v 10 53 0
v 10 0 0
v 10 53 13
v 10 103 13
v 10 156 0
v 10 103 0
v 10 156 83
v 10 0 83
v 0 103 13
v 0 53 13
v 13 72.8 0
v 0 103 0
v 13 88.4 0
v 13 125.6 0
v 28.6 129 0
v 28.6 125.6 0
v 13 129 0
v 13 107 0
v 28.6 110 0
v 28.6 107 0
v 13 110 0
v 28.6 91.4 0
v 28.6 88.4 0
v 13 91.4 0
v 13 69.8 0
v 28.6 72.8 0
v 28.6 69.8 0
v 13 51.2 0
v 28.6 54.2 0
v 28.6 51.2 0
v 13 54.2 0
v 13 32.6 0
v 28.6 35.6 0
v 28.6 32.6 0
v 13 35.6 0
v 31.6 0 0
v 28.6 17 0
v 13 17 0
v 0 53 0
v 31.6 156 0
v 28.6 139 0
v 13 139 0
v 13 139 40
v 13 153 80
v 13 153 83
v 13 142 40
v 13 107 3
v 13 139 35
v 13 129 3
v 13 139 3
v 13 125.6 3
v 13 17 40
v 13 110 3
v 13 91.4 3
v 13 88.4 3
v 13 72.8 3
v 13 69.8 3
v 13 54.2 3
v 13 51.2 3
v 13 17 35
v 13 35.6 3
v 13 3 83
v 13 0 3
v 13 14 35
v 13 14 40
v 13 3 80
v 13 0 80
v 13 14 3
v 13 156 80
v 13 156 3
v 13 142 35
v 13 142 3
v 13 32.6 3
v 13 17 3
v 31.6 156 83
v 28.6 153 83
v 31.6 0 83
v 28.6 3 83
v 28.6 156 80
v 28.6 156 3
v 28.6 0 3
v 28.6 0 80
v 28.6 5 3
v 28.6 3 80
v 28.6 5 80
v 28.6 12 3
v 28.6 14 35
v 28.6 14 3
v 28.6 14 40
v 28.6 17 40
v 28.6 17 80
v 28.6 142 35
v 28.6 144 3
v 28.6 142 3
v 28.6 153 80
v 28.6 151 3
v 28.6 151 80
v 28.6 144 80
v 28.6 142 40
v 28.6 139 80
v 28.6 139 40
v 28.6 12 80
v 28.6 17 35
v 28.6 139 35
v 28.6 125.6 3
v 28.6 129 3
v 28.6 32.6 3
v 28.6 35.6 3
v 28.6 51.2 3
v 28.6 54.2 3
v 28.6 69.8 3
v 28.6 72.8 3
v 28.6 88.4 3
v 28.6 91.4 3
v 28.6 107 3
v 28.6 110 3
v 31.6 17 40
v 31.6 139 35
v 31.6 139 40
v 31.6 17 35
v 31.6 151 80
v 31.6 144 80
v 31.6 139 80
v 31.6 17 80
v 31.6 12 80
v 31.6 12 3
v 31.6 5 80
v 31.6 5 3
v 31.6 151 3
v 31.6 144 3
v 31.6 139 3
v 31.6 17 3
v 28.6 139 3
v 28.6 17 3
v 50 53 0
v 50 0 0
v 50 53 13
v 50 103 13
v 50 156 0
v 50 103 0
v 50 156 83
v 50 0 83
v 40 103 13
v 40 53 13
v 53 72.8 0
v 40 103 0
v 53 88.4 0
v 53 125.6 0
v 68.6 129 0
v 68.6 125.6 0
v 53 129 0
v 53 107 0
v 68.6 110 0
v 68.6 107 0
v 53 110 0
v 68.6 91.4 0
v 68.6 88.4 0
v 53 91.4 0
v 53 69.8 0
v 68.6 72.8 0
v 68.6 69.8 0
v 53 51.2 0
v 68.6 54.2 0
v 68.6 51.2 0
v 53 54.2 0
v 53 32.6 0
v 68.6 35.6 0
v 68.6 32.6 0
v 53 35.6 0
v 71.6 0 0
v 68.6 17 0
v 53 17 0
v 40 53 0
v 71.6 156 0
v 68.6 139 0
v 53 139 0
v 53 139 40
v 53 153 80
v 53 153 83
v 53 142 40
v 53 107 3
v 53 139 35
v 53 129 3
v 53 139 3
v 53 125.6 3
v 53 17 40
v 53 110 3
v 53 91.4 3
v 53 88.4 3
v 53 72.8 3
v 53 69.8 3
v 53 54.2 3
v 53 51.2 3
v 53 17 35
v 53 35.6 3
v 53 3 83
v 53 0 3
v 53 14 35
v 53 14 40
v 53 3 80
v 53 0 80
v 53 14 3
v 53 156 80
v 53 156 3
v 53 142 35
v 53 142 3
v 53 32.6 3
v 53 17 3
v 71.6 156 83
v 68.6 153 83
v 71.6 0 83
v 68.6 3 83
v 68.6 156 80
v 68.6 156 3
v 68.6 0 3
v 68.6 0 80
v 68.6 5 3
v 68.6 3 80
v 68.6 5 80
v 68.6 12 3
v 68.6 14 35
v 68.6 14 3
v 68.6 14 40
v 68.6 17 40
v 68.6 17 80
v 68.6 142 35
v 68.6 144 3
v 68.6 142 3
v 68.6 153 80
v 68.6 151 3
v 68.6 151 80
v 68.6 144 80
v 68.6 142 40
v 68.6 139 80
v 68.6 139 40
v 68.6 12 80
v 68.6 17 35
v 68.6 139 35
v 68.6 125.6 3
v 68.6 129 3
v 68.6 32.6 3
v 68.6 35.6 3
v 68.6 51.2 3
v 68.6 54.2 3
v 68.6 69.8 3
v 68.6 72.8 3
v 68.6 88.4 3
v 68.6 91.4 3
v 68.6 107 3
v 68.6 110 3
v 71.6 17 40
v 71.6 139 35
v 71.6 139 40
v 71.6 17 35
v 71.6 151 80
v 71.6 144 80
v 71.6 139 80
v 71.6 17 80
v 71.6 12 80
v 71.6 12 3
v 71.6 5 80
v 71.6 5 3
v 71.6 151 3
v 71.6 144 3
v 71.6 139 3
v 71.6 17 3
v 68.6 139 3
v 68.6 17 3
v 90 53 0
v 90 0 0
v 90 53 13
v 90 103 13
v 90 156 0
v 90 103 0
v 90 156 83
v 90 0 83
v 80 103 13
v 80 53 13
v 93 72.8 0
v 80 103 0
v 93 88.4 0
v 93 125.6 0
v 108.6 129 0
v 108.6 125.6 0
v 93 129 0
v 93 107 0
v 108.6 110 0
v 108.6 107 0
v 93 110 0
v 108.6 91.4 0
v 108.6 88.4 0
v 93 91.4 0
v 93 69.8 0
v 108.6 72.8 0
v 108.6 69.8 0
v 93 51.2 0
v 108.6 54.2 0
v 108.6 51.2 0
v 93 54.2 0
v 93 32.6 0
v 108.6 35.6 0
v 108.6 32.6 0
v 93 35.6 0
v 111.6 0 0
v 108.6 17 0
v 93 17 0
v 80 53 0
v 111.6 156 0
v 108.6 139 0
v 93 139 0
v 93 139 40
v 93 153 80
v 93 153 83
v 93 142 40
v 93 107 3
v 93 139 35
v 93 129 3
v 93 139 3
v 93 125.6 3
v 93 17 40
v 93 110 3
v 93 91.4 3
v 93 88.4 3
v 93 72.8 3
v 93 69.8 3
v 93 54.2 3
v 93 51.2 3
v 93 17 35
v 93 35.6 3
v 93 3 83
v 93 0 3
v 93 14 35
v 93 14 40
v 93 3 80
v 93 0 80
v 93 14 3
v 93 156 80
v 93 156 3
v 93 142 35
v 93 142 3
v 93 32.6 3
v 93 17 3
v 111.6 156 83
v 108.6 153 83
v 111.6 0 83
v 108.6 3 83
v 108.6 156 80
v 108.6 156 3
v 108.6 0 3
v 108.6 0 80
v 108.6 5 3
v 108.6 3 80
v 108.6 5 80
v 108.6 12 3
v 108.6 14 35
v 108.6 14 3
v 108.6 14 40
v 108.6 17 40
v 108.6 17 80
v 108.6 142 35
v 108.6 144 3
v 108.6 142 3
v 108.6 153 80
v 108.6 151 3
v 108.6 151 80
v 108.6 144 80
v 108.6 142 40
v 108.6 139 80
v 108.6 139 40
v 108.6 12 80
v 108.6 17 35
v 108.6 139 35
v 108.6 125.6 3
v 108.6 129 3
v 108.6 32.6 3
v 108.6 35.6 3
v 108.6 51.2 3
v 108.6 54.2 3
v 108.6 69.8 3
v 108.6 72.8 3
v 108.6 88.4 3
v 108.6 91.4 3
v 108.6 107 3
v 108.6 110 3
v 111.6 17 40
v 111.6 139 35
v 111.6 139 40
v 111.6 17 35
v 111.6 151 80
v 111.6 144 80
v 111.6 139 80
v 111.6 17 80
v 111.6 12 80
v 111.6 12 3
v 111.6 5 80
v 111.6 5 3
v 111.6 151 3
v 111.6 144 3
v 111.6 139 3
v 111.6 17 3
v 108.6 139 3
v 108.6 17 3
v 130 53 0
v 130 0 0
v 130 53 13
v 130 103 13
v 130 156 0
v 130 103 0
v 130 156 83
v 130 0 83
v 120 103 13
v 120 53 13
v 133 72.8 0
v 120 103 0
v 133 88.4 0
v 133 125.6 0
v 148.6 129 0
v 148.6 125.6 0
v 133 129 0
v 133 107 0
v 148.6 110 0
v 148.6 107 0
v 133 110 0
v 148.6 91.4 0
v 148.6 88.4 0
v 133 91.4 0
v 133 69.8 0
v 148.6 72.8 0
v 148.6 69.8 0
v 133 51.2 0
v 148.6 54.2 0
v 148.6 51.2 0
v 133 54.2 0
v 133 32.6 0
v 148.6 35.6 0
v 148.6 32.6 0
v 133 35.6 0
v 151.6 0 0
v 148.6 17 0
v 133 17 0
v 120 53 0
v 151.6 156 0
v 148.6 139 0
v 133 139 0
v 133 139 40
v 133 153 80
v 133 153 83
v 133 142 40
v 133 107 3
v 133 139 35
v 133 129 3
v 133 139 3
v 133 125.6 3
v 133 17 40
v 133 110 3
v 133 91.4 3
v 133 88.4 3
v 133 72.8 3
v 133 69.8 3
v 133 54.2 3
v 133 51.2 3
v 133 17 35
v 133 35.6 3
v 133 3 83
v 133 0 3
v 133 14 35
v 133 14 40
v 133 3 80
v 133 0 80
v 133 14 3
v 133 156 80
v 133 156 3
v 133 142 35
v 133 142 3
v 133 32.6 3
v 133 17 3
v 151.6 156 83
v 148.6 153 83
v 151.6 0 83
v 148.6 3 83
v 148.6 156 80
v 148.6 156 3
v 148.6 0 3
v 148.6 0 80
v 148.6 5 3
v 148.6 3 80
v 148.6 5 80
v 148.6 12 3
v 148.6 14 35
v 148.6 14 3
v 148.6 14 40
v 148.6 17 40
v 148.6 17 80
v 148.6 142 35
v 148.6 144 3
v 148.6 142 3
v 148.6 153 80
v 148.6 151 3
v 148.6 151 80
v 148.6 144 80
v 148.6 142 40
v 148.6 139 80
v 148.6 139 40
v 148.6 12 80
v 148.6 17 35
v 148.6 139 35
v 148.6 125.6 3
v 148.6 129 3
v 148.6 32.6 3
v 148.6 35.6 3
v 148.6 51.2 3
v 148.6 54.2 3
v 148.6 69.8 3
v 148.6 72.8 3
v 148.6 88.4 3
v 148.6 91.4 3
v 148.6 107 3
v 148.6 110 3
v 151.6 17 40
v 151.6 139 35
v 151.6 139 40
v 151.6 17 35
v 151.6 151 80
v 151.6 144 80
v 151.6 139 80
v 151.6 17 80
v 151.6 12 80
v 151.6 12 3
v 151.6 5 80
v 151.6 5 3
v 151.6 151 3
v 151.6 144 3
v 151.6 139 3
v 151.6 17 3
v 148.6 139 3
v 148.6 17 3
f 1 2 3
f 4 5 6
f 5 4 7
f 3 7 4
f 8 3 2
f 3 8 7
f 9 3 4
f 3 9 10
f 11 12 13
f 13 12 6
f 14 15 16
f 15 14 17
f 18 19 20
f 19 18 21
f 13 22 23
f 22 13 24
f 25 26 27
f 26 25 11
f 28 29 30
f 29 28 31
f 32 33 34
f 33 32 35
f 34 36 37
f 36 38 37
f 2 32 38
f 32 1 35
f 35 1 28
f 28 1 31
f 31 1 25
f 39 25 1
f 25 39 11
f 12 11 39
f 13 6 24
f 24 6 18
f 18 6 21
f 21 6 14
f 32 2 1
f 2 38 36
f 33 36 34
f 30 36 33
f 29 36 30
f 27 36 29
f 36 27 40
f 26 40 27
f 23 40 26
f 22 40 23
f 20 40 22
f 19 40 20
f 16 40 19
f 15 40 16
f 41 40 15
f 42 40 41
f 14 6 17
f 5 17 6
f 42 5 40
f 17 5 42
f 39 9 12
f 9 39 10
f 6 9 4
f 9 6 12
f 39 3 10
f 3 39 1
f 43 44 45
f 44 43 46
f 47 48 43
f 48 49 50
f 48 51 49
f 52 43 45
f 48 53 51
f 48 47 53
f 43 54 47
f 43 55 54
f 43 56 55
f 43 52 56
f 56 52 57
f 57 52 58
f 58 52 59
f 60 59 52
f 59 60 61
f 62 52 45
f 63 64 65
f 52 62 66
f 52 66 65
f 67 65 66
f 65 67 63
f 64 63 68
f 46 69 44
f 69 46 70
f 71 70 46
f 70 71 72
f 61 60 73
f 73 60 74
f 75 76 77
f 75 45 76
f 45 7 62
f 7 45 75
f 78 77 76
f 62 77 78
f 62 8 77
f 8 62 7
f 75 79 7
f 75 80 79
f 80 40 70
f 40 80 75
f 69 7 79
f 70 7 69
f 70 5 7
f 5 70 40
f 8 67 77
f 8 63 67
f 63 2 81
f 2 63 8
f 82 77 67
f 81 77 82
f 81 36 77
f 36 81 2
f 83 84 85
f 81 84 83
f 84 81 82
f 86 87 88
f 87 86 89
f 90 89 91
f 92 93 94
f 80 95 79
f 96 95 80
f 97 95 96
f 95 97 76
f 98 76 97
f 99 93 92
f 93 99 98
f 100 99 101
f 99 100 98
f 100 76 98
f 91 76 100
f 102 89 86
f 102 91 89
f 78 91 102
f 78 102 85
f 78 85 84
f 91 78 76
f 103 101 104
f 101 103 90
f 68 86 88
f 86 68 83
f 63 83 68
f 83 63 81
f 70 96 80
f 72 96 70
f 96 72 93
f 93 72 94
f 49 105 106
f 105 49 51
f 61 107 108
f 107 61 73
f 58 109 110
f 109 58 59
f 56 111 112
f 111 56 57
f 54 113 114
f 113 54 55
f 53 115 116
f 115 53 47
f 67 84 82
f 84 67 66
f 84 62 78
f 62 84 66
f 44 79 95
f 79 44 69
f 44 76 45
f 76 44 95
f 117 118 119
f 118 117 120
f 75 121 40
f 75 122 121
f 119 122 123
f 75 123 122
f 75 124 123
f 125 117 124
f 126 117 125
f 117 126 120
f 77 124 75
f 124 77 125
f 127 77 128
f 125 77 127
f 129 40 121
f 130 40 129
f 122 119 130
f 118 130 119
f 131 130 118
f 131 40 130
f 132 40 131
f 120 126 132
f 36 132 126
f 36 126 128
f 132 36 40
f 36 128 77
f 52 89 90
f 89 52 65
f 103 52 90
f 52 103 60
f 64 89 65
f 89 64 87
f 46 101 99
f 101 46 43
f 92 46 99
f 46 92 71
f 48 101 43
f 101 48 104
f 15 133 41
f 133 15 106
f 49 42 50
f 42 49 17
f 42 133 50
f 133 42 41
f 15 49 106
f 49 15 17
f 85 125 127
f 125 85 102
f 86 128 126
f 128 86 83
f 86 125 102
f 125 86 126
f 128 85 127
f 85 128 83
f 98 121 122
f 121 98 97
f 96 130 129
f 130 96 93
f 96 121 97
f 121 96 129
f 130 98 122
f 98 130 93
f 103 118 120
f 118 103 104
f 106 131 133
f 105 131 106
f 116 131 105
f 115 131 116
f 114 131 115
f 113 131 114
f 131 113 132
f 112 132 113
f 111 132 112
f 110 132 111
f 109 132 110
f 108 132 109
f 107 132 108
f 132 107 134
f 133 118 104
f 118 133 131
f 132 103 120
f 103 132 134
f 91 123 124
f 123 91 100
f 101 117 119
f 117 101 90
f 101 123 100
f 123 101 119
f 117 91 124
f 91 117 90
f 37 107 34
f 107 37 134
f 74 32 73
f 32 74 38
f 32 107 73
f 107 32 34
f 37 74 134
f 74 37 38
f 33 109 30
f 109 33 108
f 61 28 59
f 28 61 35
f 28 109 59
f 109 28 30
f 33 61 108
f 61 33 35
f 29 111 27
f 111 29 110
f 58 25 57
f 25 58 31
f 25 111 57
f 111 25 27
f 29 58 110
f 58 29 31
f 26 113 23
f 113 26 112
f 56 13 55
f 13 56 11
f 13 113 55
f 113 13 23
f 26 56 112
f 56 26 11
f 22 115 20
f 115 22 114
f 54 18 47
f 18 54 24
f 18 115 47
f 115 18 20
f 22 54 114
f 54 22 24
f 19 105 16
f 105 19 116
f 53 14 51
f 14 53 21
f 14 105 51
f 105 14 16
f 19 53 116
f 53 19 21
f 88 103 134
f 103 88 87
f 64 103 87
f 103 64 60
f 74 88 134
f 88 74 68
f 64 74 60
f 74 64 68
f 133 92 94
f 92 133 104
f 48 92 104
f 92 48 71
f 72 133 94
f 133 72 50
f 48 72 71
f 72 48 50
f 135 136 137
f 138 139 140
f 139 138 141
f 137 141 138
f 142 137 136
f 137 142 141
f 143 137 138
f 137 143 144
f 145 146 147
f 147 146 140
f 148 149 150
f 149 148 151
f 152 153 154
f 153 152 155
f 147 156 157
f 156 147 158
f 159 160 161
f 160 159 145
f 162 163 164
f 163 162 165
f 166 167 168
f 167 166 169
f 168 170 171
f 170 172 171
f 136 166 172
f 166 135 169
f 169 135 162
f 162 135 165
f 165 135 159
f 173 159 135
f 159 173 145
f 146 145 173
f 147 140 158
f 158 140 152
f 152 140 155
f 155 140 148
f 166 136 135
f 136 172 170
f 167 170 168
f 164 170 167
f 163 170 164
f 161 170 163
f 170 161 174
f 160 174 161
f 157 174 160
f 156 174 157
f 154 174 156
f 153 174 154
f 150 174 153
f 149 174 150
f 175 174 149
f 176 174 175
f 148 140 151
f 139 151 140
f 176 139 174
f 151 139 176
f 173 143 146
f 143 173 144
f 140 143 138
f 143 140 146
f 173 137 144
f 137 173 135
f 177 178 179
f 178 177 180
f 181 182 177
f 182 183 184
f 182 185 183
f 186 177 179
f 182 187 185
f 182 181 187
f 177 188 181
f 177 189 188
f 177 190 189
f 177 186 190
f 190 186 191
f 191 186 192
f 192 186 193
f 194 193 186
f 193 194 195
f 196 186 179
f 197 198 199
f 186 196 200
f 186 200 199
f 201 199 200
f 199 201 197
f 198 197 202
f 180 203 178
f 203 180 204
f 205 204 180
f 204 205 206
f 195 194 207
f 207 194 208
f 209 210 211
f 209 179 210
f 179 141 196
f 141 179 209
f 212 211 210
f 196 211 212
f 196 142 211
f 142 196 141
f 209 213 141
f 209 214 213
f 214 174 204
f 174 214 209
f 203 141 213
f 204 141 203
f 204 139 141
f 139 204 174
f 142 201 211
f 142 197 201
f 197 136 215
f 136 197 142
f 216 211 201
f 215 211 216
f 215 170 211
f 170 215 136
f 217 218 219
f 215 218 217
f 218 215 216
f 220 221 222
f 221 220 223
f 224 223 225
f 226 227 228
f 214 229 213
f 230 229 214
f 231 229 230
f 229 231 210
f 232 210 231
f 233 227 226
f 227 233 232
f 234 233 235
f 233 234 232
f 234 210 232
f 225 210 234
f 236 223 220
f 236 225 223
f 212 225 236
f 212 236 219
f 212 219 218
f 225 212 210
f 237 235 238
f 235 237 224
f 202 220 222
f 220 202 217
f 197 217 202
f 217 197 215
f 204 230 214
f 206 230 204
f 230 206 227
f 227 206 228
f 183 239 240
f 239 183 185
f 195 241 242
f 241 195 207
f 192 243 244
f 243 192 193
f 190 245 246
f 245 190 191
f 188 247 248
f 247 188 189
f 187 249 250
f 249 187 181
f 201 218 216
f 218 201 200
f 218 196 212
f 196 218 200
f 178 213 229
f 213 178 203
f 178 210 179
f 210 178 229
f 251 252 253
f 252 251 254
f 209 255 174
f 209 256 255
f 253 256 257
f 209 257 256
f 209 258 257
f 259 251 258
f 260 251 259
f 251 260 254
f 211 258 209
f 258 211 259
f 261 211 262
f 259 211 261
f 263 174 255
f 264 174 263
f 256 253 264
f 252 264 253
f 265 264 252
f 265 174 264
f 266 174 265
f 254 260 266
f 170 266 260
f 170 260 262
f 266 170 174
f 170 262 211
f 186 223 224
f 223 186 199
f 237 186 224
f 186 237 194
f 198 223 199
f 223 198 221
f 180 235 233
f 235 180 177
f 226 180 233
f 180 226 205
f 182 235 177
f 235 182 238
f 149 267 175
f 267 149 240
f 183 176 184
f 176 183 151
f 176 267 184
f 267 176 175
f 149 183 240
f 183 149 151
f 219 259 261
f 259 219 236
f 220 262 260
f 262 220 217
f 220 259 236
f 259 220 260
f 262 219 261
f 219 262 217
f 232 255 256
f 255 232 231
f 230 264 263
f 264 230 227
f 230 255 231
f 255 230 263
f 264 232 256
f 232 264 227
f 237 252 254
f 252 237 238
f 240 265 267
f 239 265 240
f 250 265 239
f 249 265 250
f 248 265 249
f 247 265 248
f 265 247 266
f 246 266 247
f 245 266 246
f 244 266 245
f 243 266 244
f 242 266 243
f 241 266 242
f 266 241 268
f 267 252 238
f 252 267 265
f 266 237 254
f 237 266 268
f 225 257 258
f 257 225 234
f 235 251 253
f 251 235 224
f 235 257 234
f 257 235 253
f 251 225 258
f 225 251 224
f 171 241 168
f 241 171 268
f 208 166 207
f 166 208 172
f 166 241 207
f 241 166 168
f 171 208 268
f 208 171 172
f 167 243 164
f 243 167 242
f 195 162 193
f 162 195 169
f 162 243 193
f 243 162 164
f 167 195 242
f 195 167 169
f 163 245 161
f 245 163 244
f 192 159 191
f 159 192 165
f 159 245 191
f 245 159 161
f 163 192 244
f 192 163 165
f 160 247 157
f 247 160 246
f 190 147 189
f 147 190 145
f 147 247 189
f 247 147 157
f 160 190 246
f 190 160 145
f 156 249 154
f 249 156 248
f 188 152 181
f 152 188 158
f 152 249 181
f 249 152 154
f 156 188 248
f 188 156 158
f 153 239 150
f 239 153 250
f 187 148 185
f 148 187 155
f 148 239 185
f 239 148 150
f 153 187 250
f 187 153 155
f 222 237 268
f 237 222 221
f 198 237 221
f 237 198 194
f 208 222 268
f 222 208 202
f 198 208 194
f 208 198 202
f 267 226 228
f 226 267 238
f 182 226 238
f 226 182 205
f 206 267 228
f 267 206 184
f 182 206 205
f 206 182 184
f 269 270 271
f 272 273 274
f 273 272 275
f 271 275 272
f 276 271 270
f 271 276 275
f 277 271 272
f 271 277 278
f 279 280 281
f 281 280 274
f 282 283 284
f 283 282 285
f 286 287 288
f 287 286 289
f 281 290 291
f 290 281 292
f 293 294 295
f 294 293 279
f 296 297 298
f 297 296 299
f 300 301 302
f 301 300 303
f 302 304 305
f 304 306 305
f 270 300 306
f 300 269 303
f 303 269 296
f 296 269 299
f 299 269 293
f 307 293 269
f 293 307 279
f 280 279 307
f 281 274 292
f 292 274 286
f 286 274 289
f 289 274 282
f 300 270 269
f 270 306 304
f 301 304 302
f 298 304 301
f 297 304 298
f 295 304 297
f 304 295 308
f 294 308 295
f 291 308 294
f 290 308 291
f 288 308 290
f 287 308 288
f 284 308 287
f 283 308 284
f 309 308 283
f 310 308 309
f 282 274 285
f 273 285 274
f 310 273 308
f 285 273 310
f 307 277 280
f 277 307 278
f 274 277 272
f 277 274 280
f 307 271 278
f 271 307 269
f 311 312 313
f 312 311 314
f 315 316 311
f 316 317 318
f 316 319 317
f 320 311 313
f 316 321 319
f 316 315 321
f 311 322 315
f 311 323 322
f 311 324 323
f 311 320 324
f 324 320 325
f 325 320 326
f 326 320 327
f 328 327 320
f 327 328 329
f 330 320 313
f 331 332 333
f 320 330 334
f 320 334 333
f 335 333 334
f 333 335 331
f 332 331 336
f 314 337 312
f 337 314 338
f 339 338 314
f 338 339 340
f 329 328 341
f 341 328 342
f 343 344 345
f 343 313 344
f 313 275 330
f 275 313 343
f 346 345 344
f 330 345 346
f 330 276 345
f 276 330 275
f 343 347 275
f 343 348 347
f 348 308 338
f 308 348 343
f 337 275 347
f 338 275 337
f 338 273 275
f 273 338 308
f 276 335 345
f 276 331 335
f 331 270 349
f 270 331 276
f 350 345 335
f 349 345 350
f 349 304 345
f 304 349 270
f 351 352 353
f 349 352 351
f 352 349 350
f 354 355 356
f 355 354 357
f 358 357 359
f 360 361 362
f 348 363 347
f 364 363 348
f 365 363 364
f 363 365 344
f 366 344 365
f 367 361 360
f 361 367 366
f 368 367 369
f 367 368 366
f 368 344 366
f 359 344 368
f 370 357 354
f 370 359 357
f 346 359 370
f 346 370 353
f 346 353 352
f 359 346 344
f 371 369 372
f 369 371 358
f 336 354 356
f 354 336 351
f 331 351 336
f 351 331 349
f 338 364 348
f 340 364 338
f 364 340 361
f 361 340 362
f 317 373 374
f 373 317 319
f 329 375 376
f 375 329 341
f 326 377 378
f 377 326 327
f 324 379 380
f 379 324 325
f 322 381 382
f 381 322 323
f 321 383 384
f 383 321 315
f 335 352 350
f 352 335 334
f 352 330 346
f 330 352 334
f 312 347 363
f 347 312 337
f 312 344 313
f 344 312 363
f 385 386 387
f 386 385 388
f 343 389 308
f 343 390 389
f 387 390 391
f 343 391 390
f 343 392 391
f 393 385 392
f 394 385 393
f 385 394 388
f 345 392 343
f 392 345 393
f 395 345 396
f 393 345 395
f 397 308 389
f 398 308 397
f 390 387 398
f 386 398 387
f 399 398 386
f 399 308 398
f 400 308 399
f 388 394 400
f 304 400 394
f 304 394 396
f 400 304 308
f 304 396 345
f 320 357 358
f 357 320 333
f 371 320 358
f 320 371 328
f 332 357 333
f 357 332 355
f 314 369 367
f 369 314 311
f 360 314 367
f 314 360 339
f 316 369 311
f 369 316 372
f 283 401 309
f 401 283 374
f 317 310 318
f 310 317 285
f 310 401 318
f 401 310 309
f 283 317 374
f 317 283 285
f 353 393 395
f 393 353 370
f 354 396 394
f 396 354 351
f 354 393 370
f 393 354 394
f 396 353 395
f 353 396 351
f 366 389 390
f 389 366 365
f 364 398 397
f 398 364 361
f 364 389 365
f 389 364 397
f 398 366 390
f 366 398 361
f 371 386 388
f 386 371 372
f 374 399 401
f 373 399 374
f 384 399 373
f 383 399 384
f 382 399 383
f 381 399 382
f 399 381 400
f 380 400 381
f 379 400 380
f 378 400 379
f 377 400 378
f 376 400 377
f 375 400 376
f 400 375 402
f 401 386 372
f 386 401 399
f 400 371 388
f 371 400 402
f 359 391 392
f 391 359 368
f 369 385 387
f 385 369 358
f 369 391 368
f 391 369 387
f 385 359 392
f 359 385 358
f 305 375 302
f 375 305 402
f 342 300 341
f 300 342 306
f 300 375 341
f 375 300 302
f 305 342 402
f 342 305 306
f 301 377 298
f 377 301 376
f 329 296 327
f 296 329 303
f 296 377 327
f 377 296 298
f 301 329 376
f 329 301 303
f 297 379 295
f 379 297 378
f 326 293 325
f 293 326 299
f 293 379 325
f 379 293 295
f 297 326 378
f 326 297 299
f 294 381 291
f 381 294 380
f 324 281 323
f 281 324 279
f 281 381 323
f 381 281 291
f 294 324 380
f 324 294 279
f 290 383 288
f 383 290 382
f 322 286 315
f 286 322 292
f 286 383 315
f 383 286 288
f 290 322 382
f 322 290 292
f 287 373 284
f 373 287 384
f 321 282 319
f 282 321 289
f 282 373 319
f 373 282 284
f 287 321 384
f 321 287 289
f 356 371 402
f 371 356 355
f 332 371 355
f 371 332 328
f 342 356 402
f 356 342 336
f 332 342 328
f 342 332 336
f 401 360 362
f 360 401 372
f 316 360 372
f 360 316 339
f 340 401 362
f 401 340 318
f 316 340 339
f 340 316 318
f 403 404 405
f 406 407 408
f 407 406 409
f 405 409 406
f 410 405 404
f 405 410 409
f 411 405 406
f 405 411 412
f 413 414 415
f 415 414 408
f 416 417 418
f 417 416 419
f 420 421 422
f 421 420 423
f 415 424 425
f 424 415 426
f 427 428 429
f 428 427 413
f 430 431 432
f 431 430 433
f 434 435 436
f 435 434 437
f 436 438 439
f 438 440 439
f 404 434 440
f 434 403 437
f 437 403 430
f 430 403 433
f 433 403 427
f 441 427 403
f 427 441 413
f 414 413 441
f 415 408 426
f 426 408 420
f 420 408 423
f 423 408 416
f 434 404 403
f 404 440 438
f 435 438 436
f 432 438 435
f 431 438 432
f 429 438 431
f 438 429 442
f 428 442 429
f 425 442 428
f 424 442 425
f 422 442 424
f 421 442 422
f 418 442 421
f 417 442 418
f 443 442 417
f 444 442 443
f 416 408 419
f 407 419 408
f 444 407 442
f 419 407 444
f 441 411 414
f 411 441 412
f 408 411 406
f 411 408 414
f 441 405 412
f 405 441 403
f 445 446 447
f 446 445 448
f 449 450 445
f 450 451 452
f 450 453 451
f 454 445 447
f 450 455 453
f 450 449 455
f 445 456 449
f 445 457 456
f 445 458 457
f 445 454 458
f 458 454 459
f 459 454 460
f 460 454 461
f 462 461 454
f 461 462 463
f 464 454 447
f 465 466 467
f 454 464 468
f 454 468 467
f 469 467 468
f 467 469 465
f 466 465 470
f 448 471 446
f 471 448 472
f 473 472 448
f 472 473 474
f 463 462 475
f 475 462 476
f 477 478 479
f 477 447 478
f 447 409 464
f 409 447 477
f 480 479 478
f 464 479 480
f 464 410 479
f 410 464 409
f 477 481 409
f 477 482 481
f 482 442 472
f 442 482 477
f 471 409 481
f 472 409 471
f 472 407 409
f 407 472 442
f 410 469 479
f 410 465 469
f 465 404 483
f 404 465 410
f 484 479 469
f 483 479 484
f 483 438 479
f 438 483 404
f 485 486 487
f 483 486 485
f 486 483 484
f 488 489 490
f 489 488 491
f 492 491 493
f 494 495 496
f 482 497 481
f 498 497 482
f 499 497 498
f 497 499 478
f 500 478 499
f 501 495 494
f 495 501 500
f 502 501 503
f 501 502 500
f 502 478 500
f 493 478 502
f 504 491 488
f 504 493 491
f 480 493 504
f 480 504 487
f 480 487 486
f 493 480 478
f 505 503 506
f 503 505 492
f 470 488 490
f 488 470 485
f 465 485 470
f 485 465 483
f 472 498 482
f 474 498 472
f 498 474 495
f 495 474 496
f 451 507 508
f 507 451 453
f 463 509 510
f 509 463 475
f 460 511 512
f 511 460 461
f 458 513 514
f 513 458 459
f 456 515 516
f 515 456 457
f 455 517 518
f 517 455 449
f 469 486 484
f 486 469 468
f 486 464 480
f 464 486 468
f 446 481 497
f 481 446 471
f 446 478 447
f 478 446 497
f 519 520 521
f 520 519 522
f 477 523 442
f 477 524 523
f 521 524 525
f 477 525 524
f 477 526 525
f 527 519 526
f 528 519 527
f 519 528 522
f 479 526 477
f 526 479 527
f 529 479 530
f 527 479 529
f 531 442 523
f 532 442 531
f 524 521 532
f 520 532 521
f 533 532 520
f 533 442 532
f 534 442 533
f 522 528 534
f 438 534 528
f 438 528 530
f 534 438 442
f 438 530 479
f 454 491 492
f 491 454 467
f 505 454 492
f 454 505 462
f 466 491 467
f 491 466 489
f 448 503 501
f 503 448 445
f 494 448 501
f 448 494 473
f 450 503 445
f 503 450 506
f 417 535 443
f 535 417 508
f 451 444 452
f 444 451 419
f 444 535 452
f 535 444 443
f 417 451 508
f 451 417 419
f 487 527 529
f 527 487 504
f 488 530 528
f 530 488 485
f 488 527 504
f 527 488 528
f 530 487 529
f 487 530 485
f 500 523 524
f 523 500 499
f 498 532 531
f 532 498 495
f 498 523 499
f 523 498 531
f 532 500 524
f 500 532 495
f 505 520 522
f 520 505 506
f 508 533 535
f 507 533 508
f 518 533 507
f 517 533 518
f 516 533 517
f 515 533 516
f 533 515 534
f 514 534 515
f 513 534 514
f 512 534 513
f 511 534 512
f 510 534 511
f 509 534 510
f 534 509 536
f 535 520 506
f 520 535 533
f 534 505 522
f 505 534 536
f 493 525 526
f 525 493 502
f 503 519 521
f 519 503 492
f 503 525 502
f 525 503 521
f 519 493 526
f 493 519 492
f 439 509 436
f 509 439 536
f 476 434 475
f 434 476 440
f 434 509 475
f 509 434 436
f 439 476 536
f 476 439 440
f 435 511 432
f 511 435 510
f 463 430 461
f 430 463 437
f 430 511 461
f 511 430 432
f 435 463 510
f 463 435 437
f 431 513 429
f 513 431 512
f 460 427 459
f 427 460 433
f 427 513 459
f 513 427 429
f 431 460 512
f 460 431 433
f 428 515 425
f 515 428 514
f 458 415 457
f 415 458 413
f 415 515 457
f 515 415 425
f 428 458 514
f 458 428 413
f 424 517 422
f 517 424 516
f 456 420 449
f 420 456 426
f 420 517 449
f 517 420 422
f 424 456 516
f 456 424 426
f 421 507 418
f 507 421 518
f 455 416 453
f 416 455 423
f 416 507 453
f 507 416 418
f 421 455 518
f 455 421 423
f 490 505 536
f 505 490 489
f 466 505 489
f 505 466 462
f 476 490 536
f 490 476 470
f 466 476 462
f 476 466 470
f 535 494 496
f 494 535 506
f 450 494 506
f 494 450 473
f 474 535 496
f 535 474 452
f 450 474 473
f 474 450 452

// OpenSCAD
wall = 3;
height = 80;
thick = 3;
totalThick = 6;
boxInternalLen = 150;
platformWdh = 10;
platformLen = 50;
nfcReaderSupporterInternalWidth = 15.6;
nfcReaderLen = 122;
nfcReaderWdhHalf = 37;
step = nfcReaderSupporterInternalWidth + wall;


difference(){
    union(){
        translate([0, (boxInternalLen + 2 * wall - platformLen) / 2, 0])
        cube([platformWdh, platformLen, 10 + wall],false);
        
        translate([platformWdh, 0, 0])
        cube([wall, boxInternalLen + 2 * thick, height + wall],false);
        
        translate([platformWdh + wall, 0, 0])
        cube([nfcReaderSupporterInternalWidth, boxInternalLen + 2 * thick, wall],false);
        
        translate([platformWdh + wall, 0, height])
        cube([nfcReaderSupporterInternalWidth, wall, wall],false);
        
        translate([platformWdh + wall, boxInternalLen + 2 * thick - wall, height])
        cube([nfcReaderSupporterInternalWidth, wall, wall],false);
        
        translate([platformWdh + wall + nfcReaderSupporterInternalWidth, 0, 0])
        cube([wall, boxInternalLen + 2 * thick, height + wall],false);
        
        translate([platformWdh + wall, (boxInternalLen + 2 * thick - nfcReaderLen - 2 * wall) / 2, wall])
        cube([nfcReaderSupporterInternalWidth, wall, nfcReaderWdhHalf],false);
        
        translate([platformWdh + wall, (boxInternalLen + 2 * thick - nfcReaderLen - 2 * wall) / 2 + nfcReaderLen + wall, wall])
        cube([nfcReaderSupporterInternalWidth, wall, nfcReaderWdhHalf],false);
    }
    translate([platformWdh + wall, (boxInternalLen + 2 * thick - nfcReaderLen - 2 * wall) / 2 + nfcReaderLen + wall - 10, 0])
    cube([nfcReaderSupporterInternalWidth, 10, wall],false);
    
    translate([platformWdh + wall + nfcReaderSupporterInternalWidth, wall + 2, wall])
    cube([wall, (boxInternalLen + 2 * thick - nfcReaderLen - 2 * wall) / 2 - wall - 4, height- wall],false);
    
    translate([platformWdh + wall + nfcReaderSupporterInternalWidth, (boxInternalLen + 2 * thick - nfcReaderLen - 2 * wall) / 2 + nfcReaderLen + wall * 2 + 2, wall])
    cube([wall, (boxInternalLen + 2 * thick - nfcReaderLen - 2 * wall) / 2 - wall - 4, height - wall],false);
    
    translate([platformWdh + wall + nfcReaderSupporterInternalWidth, (boxInternalLen + 2 * thick - nfcReaderLen - 2 * wall) / 2 + wall, wall])
    cube([wall, nfcReaderLen, nfcReaderWdhHalf - wall - 2],false);
    
    translate([platformWdh + wall + nfcReaderSupporterInternalWidth, (boxInternalLen + 2 * thick - nfcReaderLen - 2 * wall) / 2 + wall, wall + nfcReaderWdhHalf])
    cube([wall, nfcReaderLen, height - nfcReaderWdhHalf - wall],false);
    
    translate([platformWdh + wall, (boxInternalLen + 2 * thick - nfcReaderLen - 2 * wall) / 2 + wall, 0])
    cube([nfcReaderSupporterInternalWidth, nfcReaderSupporterInternalWidth, wall],false);
    
    translate([platformWdh + wall, (boxInternalLen + 2 * thick - nfcReaderLen - 2 * wall) / 2 + wall + step , 0])
    cube([nfcReaderSupporterInternalWidth, nfcReaderSupporterInternalWidth, wall],false);
    
    translate([platformWdh + wall, (boxInternalLen + 2 * thick - nfcReaderLen - 2 * wall) / 2 + wall + 2 * step , 0])
    cube([nfcReaderSupporterInternalWidth, nfcReaderSupporterInternalWidth, wall],false);
    
    translate([platformWdh + wall, (boxInternalLen + 2 * thick - nfcReaderLen - 2 * wall) / 2 + wall + 3 * step , 0])
    cube([nfcReaderSupporterInternalWidth, nfcReaderSupporterInternalWidth, wall],false);
    
    translate([platformWdh + wall, (boxInternalLen + 2 * thick - nfcReaderLen - 2 * wall) / 2 + wall + 4 * step , 0])
    cube([nfcReaderSupporterInternalWidth, nfcReaderSupporterInternalWidth, wall],false);
    
    translate([platformWdh + wall, (boxInternalLen + 2 * thick - nfcReaderLen - 2 * wall) / 2 + wall + 5 * step , 0])
    cube([nfcReaderSupporterInternalWidth, nfcReaderSupporterInternalWidth, wall],false);
    
    translate([platformWdh + wall, (boxInternalLen + 2 * thick - nfcReaderLen - 2 * wall) / 2 , wall])
    cube([nfcReaderSupporterInternalWidth, wall, nfcReaderWdhHalf - wall - 2],false);
    
    translate([platformWdh + wall, (boxInternalLen + 2 * thick - nfcReaderLen - 2 * wall) / 2 + nfcReaderLen + wall, wall])
    cube([nfcReaderSupporterInternalWidth, wall, nfcReaderWdhHalf - wall - 2],false);
}

translate([40, 0, 0])
difference(){
    union(){
        translate([0, (boxInternalLen + 2 * wall - platformLen) / 2, 0])
        cube([platformWdh, platformLen, 10 + wall],false);
        
        translate([platformWdh, 0, 0])
        cube([wall, boxInternalLen + 2 * thick, height + wall],false);
        
        translate([platformWdh + wall, 0, 0])
        cube([nfcReaderSupporterInternalWidth, boxInternalLen + 2 * thick, wall],false);
        
        translate([platformWdh + wall, 0, height])
        cube([nfcReaderSupporterInternalWidth, wall, wall],false);
        
        translate([platformWdh + wall, boxInternalLen + 2 * thick - wall, height])
        cube([nfcReaderSupporterInternalWidth, wall, wall],false);
        
        translate([platformWdh + wall + nfcReaderSupporterInternalWidth, 0, 0])
        cube([wall, boxInternalLen + 2 * thick, height + wall],false);
        
        translate([platformWdh + wall, (boxInternalLen + 2 * thick - nfcReaderLen - 2 * wall) / 2, wall])
        cube([nfcReaderSupporterInternalWidth, wall, nfcReaderWdhHalf],false);
        
        translate([platformWdh + wall, (boxInternalLen + 2 * thick - nfcReaderLen - 2 * wall) / 2 + nfcReaderLen + wall, wall])
        cube([nfcReaderSupporterInternalWidth, wall, nfcReaderWdhHalf],false);
    }
    translate([platformWdh + wall, (boxInternalLen + 2 * thick - nfcReaderLen - 2 * wall) / 2 + nfcReaderLen + wall - 10, 0])
    cube([nfcReaderSupporterInternalWidth, 10, wall],false);
    
    translate([platformWdh + wall + nfcReaderSupporterInternalWidth, wall + 2, wall])
    cube([wall, (boxInternalLen + 2 * thick - nfcReaderLen - 2 * wall) / 2 - wall - 4, height- wall],false);
    
    translate([platformWdh + wall + nfcReaderSupporterInternalWidth, (boxInternalLen + 2 * thick - nfcReaderLen - 2 * wall) / 2 + nfcReaderLen + wall * 2 + 2, wall])
    cube([wall, (boxInternalLen + 2 * thick - nfcReaderLen - 2 * wall) / 2 - wall - 4, height - wall],false);
    
    translate([platformWdh + wall + nfcReaderSupporterInternalWidth, (boxInternalLen + 2 * thick - nfcReaderLen - 2 * wall) / 2 + wall, wall])
    cube([wall, nfcReaderLen, nfcReaderWdhHalf - wall - 2],false);
    
    translate([platformWdh + wall + nfcReaderSupporterInternalWidth, (boxInternalLen + 2 * thick - nfcReaderLen - 2 * wall) / 2 + wall, wall + nfcReaderWdhHalf])
    cube([wall, nfcReaderLen, height - nfcReaderWdhHalf - wall],false);
    
    translate([platformWdh + wall, (boxInternalLen + 2 * thick - nfcReaderLen - 2 * wall) / 2 + wall, 0])
    cube([nfcReaderSupporterInternalWidth, nfcReaderSupporterInternalWidth, wall],false);
    
    translate([platformWdh + wall, (boxInternalLen + 2 * thick - nfcReaderLen - 2 * wall) / 2 + wall + step , 0])
    cube([nfcReaderSupporterInternalWidth, nfcReaderSupporterInternalWidth, wall],false);
    
    translate([platformWdh + wall, (boxInternalLen + 2 * thick - nfcReaderLen - 2 * wall) / 2 + wall + 2 * step , 0])
    cube([nfcReaderSupporterInternalWidth, nfcReaderSupporterInternalWidth, wall],false);
    
    translate([platformWdh + wall, (boxInternalLen + 2 * thick - nfcReaderLen - 2 * wall) / 2 + wall + 3 * step , 0])
    cube([nfcReaderSupporterInternalWidth, nfcReaderSupporterInternalWidth, wall],false);
    
    translate([platformWdh + wall, (boxInternalLen + 2 * thick - nfcReaderLen - 2 * wall) / 2 + wall + 4 * step , 0])
    cube([nfcReaderSupporterInternalWidth, nfcReaderSupporterInternalWidth, wall],false);
    
    translate([platformWdh + wall, (boxInternalLen + 2 * thick - nfcReaderLen - 2 * wall) / 2 + wall + 5 * step , 0])
    cube([nfcReaderSupporterInternalWidth, nfcReaderSupporterInternalWidth, wall],false);
    
    translate([platformWdh + wall, (boxInternalLen + 2 * thick - nfcReaderLen - 2 * wall) / 2 , wall])
    cube([nfcReaderSupporterInternalWidth, wall, nfcReaderWdhHalf - wall - 2],false);
    
    translate([platformWdh + wall, (boxInternalLen + 2 * thick - nfcReaderLen - 2 * wall) / 2 + nfcReaderLen + wall, wall])
    cube([nfcReaderSupporterInternalWidth, wall, nfcReaderWdhHalf - wall - 2],false);
}

translate([80, 0, 0])
difference(){
    union(){
        translate([0, (boxInternalLen + 2 * wall - platformLen) / 2, 0])
        cube([platformWdh, platformLen, 10 + wall],false);
        
        translate([platformWdh, 0, 0])
        cube([wall, boxInternalLen + 2 * thick, height + wall],false);
        
        translate([platformWdh + wall, 0, 0])
        cube([nfcReaderSupporterInternalWidth, boxInternalLen + 2 * thick, wall],false);
        
        translate([platformWdh + wall, 0, height])
        cube([nfcReaderSupporterInternalWidth, wall, wall],false);
        
        translate([platformWdh + wall, boxInternalLen + 2 * thick - wall, height])
        cube([nfcReaderSupporterInternalWidth, wall, wall],false);
        
        translate([platformWdh + wall + nfcReaderSupporterInternalWidth, 0, 0])
        cube([wall, boxInternalLen + 2 * thick, height + wall],false);
        
        translate([platformWdh + wall, (boxInternalLen + 2 * thick - nfcReaderLen - 2 * wall) / 2, wall])
        cube([nfcReaderSupporterInternalWidth, wall, nfcReaderWdhHalf],false);
        
        translate([platformWdh + wall, (boxInternalLen + 2 * thick - nfcReaderLen - 2 * wall) / 2 + nfcReaderLen + wall, wall])
        cube([nfcReaderSupporterInternalWidth, wall, nfcReaderWdhHalf],false);
    }
    translate([platformWdh + wall, (boxInternalLen + 2 * thick - nfcReaderLen - 2 * wall) / 2 + nfcReaderLen + wall - 10, 0])
    cube([nfcReaderSupporterInternalWidth, 10, wall],false);
    
    translate([platformWdh + wall + nfcReaderSupporterInternalWidth, wall + 2, wall])
    cube([wall, (boxInternalLen + 2 * thick - nfcReaderLen - 2 * wall) / 2 - wall - 4, height- wall],false);
    
    translate([platformWdh + wall + nfcReaderSupporterInternalWidth, (boxInternalLen + 2 * thick - nfcReaderLen - 2 * wall) / 2 + nfcReaderLen + wall * 2 + 2, wall])
    cube([wall, (boxInternalLen + 2 * thick - nfcReaderLen - 2 * wall) / 2 - wall - 4, height - wall],false);
    
    translate([platformWdh + wall + nfcReaderSupporterInternalWidth, (boxInternalLen + 2 * thick - nfcReaderLen - 2 * wall) / 2 + wall, wall])
    cube([wall, nfcReaderLen, nfcReaderWdhHalf - wall - 2],false);
    
    translate([platformWdh + wall + nfcReaderSupporterInternalWidth, (boxInternalLen + 2 * thick - nfcReaderLen - 2 * wall) / 2 + wall, wall + nfcReaderWdhHalf])
    cube([wall, nfcReaderLen, height - nfcReaderWdhHalf - wall],false);
    
    translate([platformWdh + wall, (boxInternalLen + 2 * thick - nfcReaderLen - 2 * wall) / 2 + wall, 0])
    cube([nfcReaderSupporterInternalWidth, nfcReaderSupporterInternalWidth, wall],false);
    
    translate([platformWdh + wall, (boxInternalLen + 2 * thick - nfcReaderLen - 2 * wall) / 2 + wall + step , 0])
    cube([nfcReaderSupporterInternalWidth, nfcReaderSupporterInternalWidth, wall],false);
    
    translate([platformWdh + wall, (boxInternalLen + 2 * thick - nfcReaderLen - 2 * wall) / 2 + wall + 2 * step , 0])
    cube([nfcReaderSupporterInternalWidth, nfcReaderSupporterInternalWidth, wall],false);
    
    translate([platformWdh + wall, (boxInternalLen + 2 * thick - nfcReaderLen - 2 * wall) / 2 + wall + 3 * step , 0])
    cube([nfcReaderSupporterInternalWidth, nfcReaderSupporterInternalWidth, wall],false);
    
    translate([platformWdh + wall, (boxInternalLen + 2 * thick - nfcReaderLen - 2 * wall) / 2 + wall + 4 * step , 0])
    cube([nfcReaderSupporterInternalWidth, nfcReaderSupporterInternalWidth, wall],false);
    
    translate([platformWdh + wall, (boxInternalLen + 2 * thick - nfcReaderLen - 2 * wall) / 2 + wall + 5 * step , 0])
    cube([nfcReaderSupporterInternalWidth, nfcReaderSupporterInternalWidth, wall],false);
    
    translate([platformWdh + wall, (boxInternalLen + 2 * thick - nfcReaderLen - 2 * wall) / 2 , wall])
    cube([nfcReaderSupporterInternalWidth, wall, nfcReaderWdhHalf - wall - 2],false);
    
    translate([platformWdh + wall, (boxInternalLen + 2 * thick - nfcReaderLen - 2 * wall) / 2 + nfcReaderLen + wall, wall])
    cube([nfcReaderSupporterInternalWidth, wall, nfcReaderWdhHalf - wall - 2],false);
}

translate([120, 0, 0])
difference(){
    union(){
        translate([0, (boxInternalLen + 2 * wall - platformLen) / 2, 0])
        cube([platformWdh, platformLen, 10 + wall],false);
        
        translate([platformWdh, 0, 0])
        cube([wall, boxInternalLen + 2 * thick, height + wall],false);
        
        translate([platformWdh + wall, 0, 0])
        cube([nfcReaderSupporterInternalWidth, boxInternalLen + 2 * thick, wall],false);
        
        translate([platformWdh + wall, 0, height])
        cube([nfcReaderSupporterInternalWidth, wall, wall],false);
        
        translate([platformWdh + wall, boxInternalLen + 2 * thick - wall, height])
        cube([nfcReaderSupporterInternalWidth, wall, wall],false);
        
        translate([platformWdh + wall + nfcReaderSupporterInternalWidth, 0, 0])
        cube([wall, boxInternalLen + 2 * thick, height + wall],false);
        
        translate([platformWdh + wall, (boxInternalLen + 2 * thick - nfcReaderLen - 2 * wall) / 2, wall])
        cube([nfcReaderSupporterInternalWidth, wall, nfcReaderWdhHalf],false);
        
        translate([platformWdh + wall, (boxInternalLen + 2 * thick - nfcReaderLen - 2 * wall) / 2 + nfcReaderLen + wall, wall])
        cube([nfcReaderSupporterInternalWidth, wall, nfcReaderWdhHalf],false);
    }
    translate([platformWdh + wall, (boxInternalLen + 2 * thick - nfcReaderLen - 2 * wall) / 2 + nfcReaderLen + wall - 10, 0])
    cube([nfcReaderSupporterInternalWidth, 10, wall],false);
    
    translate([platformWdh + wall + nfcReaderSupporterInternalWidth, wall + 2, wall])
    cube([wall, (boxInternalLen + 2 * thick - nfcReaderLen - 2 * wall) / 2 - wall - 4, height- wall],false);
    
    translate([platformWdh + wall + nfcReaderSupporterInternalWidth, (boxInternalLen + 2 * thick - nfcReaderLen - 2 * wall) / 2 + nfcReaderLen + wall * 2 + 2, wall])
    cube([wall, (boxInternalLen + 2 * thick - nfcReaderLen - 2 * wall) / 2 - wall - 4, height - wall],false);
    
    translate([platformWdh + wall + nfcReaderSupporterInternalWidth, (boxInternalLen + 2 * thick - nfcReaderLen - 2 * wall) / 2 + wall, wall])
    cube([wall, nfcReaderLen, nfcReaderWdhHalf - wall - 2],false);
    
    translate([platformWdh + wall + nfcReaderSupporterInternalWidth, (boxInternalLen + 2 * thick - nfcReaderLen - 2 * wall) / 2 + wall, wall + nfcReaderWdhHalf])
    cube([wall, nfcReaderLen, height - nfcReaderWdhHalf - wall],false);
    
    translate([platformWdh + wall, (boxInternalLen + 2 * thick - nfcReaderLen - 2 * wall) / 2 + wall, 0])
    cube([nfcReaderSupporterInternalWidth, nfcReaderSupporterInternalWidth, wall],false);
    
    translate([platformWdh + wall, (boxInternalLen + 2 * thick - nfcReaderLen - 2 * wall) / 2 + wall + step , 0])
    cube([nfcReaderSupporterInternalWidth, nfcReaderSupporterInternalWidth, wall],false);
    
    translate([platformWdh + wall, (boxInternalLen + 2 * thick - nfcReaderLen - 2 * wall) / 2 + wall + 2 * step , 0])
    cube([nfcReaderSupporterInternalWidth, nfcReaderSupporterInternalWidth, wall],false);
    
    translate([platformWdh + wall, (boxInternalLen + 2 * thick - nfcReaderLen - 2 * wall) / 2 + wall + 3 * step , 0])
    cube([nfcReaderSupporterInternalWidth, nfcReaderSupporterInternalWidth, wall],false);
    
    translate([platformWdh + wall, (boxInternalLen + 2 * thick - nfcReaderLen - 2 * wall) / 2 + wall + 4 * step , 0])
    cube([nfcReaderSupporterInternalWidth, nfcReaderSupporterInternalWidth, wall],false);
    
    translate([platformWdh + wall, (boxInternalLen + 2 * thick - nfcReaderLen - 2 * wall) / 2 + wall + 5 * step , 0])
    cube([nfcReaderSupporterInternalWidth, nfcReaderSupporterInternalWidth, wall],false);
    
    translate([platformWdh + wall, (boxInternalLen + 2 * thick - nfcReaderLen - 2 * wall) / 2 , wall])
    cube([nfcReaderSupporterInternalWidth, wall, nfcReaderWdhHalf - wall - 2],false);
    
    translate([platformWdh + wall, (boxInternalLen + 2 * thick - nfcReaderLen - 2 * wall) / 2 + nfcReaderLen + wall, wall])
    cube([nfcReaderSupporterInternalWidth, wall, nfcReaderWdhHalf - wall - 2],false);
}
